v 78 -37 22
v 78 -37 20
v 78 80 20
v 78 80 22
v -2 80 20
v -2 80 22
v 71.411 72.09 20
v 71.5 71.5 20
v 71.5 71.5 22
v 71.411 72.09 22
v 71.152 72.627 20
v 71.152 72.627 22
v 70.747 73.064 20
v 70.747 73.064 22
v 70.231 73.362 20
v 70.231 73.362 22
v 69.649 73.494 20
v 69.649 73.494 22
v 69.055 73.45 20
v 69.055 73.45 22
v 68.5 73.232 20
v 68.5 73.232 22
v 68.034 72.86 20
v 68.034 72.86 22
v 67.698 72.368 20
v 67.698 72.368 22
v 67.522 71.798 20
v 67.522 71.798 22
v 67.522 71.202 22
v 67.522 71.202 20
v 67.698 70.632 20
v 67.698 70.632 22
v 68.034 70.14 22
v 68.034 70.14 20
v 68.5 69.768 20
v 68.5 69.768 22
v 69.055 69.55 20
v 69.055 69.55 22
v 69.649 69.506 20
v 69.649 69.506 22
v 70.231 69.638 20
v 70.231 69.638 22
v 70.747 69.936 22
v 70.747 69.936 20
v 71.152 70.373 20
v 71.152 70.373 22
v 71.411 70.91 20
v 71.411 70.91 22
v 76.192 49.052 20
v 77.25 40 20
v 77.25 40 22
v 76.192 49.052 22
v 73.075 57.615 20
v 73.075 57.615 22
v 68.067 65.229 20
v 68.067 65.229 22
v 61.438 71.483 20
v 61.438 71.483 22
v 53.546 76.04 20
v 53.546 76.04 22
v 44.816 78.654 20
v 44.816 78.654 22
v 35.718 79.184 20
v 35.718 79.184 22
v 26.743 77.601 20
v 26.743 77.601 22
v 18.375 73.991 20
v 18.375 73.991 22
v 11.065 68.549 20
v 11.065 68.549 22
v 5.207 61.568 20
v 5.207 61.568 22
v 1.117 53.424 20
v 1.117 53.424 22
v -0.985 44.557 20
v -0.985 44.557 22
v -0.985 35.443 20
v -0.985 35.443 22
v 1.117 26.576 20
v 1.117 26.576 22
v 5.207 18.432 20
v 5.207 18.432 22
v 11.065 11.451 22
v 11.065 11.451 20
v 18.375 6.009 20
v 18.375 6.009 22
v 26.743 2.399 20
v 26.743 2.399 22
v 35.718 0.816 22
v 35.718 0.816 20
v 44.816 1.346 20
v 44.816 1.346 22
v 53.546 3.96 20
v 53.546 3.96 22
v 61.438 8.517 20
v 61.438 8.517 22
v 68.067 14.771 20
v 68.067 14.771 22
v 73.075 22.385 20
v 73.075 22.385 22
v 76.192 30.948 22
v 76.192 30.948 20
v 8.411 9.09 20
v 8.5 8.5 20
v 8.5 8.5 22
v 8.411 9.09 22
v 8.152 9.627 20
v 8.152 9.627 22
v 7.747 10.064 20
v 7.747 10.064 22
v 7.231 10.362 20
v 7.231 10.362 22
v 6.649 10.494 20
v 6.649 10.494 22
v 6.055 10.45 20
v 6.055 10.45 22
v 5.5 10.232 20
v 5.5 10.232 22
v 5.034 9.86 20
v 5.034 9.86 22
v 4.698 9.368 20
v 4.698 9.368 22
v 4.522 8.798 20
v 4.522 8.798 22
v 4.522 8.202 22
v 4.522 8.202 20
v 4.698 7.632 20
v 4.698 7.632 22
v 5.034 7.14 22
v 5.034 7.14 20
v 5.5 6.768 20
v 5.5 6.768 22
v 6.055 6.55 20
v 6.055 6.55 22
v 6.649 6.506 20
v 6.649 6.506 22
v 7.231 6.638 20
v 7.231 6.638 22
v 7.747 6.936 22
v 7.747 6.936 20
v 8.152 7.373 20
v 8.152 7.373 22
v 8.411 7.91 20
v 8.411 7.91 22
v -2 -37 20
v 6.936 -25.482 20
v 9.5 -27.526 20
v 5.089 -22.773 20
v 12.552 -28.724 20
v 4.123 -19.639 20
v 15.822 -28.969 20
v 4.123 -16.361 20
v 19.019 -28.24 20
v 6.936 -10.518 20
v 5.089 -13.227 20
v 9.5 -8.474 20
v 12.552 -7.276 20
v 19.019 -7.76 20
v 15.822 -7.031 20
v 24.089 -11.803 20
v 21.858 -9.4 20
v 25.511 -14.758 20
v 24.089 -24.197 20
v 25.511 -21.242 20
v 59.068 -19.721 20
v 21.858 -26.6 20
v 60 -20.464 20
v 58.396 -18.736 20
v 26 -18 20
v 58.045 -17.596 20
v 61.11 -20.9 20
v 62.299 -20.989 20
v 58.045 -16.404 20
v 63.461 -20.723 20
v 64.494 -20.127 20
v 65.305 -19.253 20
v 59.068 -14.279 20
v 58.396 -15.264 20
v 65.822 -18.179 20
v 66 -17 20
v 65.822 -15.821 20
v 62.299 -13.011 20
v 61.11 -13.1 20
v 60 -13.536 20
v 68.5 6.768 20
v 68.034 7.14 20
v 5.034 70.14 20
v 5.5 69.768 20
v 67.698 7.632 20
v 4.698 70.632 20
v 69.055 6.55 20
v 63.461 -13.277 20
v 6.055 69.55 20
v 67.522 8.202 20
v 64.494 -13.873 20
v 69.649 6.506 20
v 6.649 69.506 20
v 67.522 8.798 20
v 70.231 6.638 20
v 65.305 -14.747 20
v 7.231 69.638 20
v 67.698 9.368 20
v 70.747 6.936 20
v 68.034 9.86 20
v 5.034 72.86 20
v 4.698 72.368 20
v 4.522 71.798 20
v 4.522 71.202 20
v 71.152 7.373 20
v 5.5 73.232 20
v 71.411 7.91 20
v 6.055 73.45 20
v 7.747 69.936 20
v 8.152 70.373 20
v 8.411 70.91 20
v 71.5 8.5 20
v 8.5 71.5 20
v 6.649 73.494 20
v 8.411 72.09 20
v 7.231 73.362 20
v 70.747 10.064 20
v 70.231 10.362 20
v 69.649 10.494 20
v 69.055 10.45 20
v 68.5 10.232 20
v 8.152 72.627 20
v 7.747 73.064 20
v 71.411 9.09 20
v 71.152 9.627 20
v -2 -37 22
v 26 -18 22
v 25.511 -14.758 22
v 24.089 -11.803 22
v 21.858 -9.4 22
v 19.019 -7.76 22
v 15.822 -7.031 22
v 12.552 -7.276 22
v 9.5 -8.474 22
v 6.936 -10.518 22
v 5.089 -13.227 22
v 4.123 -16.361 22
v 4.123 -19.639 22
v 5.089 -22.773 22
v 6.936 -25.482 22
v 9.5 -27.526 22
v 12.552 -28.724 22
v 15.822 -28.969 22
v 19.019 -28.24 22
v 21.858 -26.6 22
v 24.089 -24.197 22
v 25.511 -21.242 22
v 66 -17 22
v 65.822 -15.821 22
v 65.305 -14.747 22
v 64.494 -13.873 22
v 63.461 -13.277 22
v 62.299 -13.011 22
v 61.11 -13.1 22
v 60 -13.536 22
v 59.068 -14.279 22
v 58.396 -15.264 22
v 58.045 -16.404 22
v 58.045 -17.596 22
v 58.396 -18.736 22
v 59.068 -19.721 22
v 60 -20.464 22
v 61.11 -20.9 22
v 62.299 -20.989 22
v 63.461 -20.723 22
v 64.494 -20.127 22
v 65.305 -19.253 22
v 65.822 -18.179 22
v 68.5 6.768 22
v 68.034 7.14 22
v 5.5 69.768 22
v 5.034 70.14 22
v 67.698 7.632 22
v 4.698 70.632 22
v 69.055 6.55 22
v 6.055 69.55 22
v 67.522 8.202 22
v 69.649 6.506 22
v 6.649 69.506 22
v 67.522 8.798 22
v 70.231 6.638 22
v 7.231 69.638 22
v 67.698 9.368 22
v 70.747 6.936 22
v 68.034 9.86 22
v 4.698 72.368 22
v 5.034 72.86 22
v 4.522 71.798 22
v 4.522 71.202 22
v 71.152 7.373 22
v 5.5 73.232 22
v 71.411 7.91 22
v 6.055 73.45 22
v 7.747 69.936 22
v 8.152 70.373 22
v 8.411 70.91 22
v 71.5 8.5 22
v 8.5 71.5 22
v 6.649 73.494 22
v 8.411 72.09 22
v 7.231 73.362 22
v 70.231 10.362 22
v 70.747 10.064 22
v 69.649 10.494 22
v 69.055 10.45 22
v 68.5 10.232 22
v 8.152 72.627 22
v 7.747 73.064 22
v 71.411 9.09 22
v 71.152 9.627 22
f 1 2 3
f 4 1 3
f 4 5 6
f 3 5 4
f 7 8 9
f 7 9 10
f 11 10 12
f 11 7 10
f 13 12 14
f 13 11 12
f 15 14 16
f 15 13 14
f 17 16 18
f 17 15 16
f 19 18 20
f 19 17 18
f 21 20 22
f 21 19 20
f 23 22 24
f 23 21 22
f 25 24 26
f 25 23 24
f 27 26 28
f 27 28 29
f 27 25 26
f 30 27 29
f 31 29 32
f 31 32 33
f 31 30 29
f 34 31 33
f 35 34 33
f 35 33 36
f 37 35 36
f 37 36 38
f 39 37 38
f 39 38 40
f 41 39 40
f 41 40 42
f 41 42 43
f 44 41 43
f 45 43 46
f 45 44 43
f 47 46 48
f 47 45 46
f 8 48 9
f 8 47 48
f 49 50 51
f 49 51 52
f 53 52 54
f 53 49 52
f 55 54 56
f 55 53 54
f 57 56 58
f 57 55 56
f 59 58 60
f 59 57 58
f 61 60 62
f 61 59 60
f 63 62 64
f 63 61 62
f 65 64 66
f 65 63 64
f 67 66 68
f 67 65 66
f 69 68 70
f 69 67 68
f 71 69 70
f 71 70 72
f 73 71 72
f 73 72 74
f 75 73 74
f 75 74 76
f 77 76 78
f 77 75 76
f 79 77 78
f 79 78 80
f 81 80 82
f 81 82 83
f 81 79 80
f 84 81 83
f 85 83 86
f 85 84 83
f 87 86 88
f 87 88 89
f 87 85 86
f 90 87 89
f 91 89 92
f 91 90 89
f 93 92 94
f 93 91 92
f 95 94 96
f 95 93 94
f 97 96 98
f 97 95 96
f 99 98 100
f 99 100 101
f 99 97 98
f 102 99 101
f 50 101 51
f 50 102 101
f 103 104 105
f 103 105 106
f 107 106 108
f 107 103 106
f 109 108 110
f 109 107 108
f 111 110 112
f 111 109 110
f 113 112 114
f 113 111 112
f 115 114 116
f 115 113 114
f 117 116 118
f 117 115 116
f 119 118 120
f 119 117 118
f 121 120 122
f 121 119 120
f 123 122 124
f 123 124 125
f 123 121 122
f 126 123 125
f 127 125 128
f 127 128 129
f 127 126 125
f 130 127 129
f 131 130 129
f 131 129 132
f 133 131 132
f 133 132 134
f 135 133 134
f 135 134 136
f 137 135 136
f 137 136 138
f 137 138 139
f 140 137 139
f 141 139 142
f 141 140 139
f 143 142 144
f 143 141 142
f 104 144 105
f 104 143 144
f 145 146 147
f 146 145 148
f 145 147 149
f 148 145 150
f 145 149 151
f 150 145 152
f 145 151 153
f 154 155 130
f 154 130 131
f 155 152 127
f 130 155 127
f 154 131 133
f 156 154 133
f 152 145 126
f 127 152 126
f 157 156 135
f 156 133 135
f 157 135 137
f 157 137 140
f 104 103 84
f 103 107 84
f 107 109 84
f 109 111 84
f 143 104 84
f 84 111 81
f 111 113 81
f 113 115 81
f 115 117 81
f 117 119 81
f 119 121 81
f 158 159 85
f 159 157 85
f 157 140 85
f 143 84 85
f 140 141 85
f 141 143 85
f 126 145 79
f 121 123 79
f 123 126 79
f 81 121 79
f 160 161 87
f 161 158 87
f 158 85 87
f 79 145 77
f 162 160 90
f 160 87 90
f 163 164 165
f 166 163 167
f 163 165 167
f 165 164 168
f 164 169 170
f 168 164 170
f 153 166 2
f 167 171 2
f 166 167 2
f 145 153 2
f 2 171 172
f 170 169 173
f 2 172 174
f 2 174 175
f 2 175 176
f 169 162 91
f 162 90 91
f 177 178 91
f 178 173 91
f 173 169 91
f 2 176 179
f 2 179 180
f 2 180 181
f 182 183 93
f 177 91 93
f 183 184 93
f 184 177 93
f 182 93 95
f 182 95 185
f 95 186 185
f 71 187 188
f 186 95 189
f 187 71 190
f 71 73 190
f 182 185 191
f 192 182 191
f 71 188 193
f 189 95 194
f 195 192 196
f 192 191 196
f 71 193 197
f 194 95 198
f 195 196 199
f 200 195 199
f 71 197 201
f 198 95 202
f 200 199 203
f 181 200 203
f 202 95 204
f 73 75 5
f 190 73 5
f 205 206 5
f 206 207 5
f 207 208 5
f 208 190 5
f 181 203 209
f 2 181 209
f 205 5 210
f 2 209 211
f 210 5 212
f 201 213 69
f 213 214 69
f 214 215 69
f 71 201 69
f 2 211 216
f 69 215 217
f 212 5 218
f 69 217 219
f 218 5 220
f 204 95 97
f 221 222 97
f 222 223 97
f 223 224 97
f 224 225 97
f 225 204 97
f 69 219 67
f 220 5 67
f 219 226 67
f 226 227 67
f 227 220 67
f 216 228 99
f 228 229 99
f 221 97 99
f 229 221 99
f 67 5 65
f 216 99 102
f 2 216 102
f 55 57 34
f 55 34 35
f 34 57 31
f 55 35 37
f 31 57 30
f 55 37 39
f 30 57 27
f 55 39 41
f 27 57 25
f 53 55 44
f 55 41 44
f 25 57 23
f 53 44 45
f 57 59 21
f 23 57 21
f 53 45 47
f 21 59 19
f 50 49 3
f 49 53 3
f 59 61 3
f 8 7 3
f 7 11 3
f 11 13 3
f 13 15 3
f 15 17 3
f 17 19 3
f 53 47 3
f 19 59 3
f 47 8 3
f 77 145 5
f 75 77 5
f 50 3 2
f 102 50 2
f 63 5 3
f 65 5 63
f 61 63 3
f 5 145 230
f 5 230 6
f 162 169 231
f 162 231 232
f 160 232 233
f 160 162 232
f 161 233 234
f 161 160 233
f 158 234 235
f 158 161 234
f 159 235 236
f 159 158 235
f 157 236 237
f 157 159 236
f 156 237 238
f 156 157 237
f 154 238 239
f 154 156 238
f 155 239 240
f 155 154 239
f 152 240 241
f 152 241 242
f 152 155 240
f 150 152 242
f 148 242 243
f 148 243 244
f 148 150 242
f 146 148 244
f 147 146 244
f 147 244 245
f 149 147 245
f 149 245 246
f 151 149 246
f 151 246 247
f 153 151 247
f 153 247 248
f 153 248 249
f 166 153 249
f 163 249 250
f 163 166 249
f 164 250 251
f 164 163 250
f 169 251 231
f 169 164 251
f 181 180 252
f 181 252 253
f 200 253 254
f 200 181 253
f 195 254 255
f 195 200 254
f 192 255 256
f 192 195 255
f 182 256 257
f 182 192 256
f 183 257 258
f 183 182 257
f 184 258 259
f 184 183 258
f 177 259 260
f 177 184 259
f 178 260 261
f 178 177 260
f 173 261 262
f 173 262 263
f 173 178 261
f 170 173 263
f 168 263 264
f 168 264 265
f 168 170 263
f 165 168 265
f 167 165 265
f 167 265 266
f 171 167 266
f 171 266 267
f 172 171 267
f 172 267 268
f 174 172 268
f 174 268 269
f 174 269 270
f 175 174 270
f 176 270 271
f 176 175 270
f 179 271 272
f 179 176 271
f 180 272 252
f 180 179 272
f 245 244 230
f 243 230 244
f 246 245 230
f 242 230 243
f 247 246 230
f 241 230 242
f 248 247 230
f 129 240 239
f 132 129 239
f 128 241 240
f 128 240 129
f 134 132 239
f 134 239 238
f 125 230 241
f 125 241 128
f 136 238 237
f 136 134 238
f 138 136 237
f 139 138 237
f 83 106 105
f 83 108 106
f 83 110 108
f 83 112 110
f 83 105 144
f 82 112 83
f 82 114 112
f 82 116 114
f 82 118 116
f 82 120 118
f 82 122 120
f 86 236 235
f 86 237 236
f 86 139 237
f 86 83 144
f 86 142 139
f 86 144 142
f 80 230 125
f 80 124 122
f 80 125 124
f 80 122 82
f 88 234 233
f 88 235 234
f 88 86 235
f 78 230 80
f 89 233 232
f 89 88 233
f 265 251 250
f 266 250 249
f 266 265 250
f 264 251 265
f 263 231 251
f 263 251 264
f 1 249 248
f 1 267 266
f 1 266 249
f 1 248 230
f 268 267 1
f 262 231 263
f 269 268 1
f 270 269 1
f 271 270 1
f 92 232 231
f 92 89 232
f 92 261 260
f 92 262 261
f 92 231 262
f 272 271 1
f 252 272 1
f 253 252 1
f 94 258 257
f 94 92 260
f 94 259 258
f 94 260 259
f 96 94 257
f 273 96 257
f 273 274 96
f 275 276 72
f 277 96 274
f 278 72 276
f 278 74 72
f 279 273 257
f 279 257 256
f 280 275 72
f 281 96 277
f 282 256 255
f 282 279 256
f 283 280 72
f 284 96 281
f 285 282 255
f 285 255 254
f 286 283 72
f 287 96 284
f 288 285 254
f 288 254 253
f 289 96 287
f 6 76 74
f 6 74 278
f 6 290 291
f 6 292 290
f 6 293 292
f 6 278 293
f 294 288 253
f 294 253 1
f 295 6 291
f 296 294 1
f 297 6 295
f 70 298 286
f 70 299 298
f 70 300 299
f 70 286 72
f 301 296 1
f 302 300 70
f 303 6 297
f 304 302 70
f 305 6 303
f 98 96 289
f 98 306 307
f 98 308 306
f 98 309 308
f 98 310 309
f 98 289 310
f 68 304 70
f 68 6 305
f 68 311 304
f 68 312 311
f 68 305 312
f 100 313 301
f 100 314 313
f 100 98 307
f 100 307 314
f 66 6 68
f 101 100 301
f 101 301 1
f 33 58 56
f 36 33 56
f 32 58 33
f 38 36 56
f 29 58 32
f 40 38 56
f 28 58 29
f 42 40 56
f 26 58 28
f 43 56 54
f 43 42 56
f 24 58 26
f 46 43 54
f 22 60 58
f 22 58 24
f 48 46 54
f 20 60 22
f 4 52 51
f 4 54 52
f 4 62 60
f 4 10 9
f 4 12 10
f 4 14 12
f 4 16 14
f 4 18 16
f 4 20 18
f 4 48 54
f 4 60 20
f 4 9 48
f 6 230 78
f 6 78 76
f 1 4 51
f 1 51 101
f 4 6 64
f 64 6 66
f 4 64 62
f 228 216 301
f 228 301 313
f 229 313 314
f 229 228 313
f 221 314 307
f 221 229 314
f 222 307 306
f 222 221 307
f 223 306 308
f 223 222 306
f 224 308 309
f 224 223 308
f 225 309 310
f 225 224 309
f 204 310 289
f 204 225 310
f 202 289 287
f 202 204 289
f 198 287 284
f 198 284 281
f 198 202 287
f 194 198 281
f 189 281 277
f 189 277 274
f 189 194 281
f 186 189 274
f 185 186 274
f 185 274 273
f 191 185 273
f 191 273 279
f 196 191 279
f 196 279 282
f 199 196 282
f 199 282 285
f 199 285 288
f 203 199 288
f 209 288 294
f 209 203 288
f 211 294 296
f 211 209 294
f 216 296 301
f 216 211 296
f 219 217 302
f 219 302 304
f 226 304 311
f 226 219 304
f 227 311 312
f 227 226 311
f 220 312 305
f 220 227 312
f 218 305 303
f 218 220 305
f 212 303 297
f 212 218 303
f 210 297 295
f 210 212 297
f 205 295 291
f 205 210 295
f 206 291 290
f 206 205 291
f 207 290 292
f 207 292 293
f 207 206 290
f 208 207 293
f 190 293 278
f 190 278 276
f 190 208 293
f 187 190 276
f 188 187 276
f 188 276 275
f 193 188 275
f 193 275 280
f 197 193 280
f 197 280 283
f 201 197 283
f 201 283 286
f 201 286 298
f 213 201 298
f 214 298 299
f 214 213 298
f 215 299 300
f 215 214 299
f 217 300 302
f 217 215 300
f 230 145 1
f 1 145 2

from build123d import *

# Parameters (mm, degrees)
CYLINDER005_R     = 2
CYLINDER005_DEPTH = 2
CYLINDER006_R     = 2
CYLINDER006_DEPTH = 2
CYLINDER004_R     = 2
CYLINDER004_DEPTH = 2
CYLINDER003_R     = 2
CYLINDER003_DEPTH = 2
CYLINDER022_R     = 11
CYLINDER022_DEPTH = 2
CYLINDER023_R     = 4
CYLINDER023_DEPTH = 2
CYLINDER002_R     = 39.25
CYLINDER002_DEPTH = 2
BOX002_W          = 80
BOX002_H          = 117
BOX002_DEPTH      = 2


with BuildPart() as mounthole002:
    # Cylinder005 → Cylinder005 (new body)
    with BuildSketch(Plane(origin=(63, 63, 20), x_dir=(1, 0, 0), z_dir=(0, 0, 1))):
        Circle(CYLINDER005_R)
    extrude(amount=CYLINDER005_DEPTH)


with BuildPart() as mounthole003:
    # Cylinder006 → Cylinder006 (new body)
    with BuildSketch(Plane(origin=(0, 63, 20), x_dir=(1, 0, 0), z_dir=(0, 0, 1))):
        Circle(CYLINDER006_R)
    extrude(amount=CYLINDER006_DEPTH)


with BuildPart() as mounthole001:
    # Cylinder004 → Cylinder004 (new body)
    with BuildSketch(Plane(origin=(63, 0, 20), x_dir=(1, 0, 0), z_dir=(0, 0, 1))):
        Circle(CYLINDER004_R)
    extrude(amount=CYLINDER004_DEPTH)


with BuildPart() as mountholes:
    # Cylinder003 → Cylinder003 (new body)
    with BuildSketch(Plane.XY.offset(20)):
        Circle(CYLINDER003_R)
    extrude(amount=CYLINDER003_DEPTH)

    # Fusion: union MountHole002, MountHole003, MountHole001
    add(mounthole002.part)
    add(mounthole003.part)
    add(mounthole001.part)


with BuildPart() as mountholes_1:
    # Fusion placement: moved
    add(mountholes.part.moved(Location((6.5, 6.5, 0))))


with BuildPart() as mounttubehole:
    # Cylinder022 → Cylinder022 (new body)
    with BuildSketch(Plane(origin=(15, -20, 20), x_dir=(1, 0, 0), z_dir=(0, 0, 1))):
        Circle(CYLINDER022_R)
    extrude(amount=CYLINDER022_DEPTH)


with BuildPart() as volumehole001:
    # Cylinder023 → Cylinder023 (new body)
    with BuildSketch(Plane(origin=(62, -19, 20), x_dir=(1, 0, 0), z_dir=(0, 0, 1))):
        Circle(CYLINDER023_R)
    extrude(amount=CYLINDER023_DEPTH)


with BuildPart() as mountpunch:
    # Cylinder002 → Cylinder002 (new body)
    with BuildSketch(Plane(origin=(38, 38, 20), x_dir=(1, 0, 0), z_dir=(0, 0, 1))):
        Circle(CYLINDER002_R)
    extrude(amount=CYLINDER002_DEPTH)

    # Fusion001: union MountHoles, MountTubeHole, VolumeHole001
    add(mountholes_1.part)
    add(mounttubehole.part)
    add(volumehole001.part)


with BuildPart() as mount:
    # Box002 → Box002 (new body)
    with BuildSketch(Plane(origin=(-2, -39, 20), x_dir=(1, 0, 0), z_dir=(0, 0, 1))):
        with Locations((40, 58.5)):
            Rectangle(BOX002_W, BOX002_H)
    extrude(amount=BOX002_DEPTH)

    # Cut013: cut MOUNTPUNCH
    add(mountpunch.part, mode=Mode.SUBTRACT)


with BuildPart() as mount_1:
    # Cut013 placement: moved
    add(mount.part.moved(Location((0, 2, 0))))


solid = mount_1.part
